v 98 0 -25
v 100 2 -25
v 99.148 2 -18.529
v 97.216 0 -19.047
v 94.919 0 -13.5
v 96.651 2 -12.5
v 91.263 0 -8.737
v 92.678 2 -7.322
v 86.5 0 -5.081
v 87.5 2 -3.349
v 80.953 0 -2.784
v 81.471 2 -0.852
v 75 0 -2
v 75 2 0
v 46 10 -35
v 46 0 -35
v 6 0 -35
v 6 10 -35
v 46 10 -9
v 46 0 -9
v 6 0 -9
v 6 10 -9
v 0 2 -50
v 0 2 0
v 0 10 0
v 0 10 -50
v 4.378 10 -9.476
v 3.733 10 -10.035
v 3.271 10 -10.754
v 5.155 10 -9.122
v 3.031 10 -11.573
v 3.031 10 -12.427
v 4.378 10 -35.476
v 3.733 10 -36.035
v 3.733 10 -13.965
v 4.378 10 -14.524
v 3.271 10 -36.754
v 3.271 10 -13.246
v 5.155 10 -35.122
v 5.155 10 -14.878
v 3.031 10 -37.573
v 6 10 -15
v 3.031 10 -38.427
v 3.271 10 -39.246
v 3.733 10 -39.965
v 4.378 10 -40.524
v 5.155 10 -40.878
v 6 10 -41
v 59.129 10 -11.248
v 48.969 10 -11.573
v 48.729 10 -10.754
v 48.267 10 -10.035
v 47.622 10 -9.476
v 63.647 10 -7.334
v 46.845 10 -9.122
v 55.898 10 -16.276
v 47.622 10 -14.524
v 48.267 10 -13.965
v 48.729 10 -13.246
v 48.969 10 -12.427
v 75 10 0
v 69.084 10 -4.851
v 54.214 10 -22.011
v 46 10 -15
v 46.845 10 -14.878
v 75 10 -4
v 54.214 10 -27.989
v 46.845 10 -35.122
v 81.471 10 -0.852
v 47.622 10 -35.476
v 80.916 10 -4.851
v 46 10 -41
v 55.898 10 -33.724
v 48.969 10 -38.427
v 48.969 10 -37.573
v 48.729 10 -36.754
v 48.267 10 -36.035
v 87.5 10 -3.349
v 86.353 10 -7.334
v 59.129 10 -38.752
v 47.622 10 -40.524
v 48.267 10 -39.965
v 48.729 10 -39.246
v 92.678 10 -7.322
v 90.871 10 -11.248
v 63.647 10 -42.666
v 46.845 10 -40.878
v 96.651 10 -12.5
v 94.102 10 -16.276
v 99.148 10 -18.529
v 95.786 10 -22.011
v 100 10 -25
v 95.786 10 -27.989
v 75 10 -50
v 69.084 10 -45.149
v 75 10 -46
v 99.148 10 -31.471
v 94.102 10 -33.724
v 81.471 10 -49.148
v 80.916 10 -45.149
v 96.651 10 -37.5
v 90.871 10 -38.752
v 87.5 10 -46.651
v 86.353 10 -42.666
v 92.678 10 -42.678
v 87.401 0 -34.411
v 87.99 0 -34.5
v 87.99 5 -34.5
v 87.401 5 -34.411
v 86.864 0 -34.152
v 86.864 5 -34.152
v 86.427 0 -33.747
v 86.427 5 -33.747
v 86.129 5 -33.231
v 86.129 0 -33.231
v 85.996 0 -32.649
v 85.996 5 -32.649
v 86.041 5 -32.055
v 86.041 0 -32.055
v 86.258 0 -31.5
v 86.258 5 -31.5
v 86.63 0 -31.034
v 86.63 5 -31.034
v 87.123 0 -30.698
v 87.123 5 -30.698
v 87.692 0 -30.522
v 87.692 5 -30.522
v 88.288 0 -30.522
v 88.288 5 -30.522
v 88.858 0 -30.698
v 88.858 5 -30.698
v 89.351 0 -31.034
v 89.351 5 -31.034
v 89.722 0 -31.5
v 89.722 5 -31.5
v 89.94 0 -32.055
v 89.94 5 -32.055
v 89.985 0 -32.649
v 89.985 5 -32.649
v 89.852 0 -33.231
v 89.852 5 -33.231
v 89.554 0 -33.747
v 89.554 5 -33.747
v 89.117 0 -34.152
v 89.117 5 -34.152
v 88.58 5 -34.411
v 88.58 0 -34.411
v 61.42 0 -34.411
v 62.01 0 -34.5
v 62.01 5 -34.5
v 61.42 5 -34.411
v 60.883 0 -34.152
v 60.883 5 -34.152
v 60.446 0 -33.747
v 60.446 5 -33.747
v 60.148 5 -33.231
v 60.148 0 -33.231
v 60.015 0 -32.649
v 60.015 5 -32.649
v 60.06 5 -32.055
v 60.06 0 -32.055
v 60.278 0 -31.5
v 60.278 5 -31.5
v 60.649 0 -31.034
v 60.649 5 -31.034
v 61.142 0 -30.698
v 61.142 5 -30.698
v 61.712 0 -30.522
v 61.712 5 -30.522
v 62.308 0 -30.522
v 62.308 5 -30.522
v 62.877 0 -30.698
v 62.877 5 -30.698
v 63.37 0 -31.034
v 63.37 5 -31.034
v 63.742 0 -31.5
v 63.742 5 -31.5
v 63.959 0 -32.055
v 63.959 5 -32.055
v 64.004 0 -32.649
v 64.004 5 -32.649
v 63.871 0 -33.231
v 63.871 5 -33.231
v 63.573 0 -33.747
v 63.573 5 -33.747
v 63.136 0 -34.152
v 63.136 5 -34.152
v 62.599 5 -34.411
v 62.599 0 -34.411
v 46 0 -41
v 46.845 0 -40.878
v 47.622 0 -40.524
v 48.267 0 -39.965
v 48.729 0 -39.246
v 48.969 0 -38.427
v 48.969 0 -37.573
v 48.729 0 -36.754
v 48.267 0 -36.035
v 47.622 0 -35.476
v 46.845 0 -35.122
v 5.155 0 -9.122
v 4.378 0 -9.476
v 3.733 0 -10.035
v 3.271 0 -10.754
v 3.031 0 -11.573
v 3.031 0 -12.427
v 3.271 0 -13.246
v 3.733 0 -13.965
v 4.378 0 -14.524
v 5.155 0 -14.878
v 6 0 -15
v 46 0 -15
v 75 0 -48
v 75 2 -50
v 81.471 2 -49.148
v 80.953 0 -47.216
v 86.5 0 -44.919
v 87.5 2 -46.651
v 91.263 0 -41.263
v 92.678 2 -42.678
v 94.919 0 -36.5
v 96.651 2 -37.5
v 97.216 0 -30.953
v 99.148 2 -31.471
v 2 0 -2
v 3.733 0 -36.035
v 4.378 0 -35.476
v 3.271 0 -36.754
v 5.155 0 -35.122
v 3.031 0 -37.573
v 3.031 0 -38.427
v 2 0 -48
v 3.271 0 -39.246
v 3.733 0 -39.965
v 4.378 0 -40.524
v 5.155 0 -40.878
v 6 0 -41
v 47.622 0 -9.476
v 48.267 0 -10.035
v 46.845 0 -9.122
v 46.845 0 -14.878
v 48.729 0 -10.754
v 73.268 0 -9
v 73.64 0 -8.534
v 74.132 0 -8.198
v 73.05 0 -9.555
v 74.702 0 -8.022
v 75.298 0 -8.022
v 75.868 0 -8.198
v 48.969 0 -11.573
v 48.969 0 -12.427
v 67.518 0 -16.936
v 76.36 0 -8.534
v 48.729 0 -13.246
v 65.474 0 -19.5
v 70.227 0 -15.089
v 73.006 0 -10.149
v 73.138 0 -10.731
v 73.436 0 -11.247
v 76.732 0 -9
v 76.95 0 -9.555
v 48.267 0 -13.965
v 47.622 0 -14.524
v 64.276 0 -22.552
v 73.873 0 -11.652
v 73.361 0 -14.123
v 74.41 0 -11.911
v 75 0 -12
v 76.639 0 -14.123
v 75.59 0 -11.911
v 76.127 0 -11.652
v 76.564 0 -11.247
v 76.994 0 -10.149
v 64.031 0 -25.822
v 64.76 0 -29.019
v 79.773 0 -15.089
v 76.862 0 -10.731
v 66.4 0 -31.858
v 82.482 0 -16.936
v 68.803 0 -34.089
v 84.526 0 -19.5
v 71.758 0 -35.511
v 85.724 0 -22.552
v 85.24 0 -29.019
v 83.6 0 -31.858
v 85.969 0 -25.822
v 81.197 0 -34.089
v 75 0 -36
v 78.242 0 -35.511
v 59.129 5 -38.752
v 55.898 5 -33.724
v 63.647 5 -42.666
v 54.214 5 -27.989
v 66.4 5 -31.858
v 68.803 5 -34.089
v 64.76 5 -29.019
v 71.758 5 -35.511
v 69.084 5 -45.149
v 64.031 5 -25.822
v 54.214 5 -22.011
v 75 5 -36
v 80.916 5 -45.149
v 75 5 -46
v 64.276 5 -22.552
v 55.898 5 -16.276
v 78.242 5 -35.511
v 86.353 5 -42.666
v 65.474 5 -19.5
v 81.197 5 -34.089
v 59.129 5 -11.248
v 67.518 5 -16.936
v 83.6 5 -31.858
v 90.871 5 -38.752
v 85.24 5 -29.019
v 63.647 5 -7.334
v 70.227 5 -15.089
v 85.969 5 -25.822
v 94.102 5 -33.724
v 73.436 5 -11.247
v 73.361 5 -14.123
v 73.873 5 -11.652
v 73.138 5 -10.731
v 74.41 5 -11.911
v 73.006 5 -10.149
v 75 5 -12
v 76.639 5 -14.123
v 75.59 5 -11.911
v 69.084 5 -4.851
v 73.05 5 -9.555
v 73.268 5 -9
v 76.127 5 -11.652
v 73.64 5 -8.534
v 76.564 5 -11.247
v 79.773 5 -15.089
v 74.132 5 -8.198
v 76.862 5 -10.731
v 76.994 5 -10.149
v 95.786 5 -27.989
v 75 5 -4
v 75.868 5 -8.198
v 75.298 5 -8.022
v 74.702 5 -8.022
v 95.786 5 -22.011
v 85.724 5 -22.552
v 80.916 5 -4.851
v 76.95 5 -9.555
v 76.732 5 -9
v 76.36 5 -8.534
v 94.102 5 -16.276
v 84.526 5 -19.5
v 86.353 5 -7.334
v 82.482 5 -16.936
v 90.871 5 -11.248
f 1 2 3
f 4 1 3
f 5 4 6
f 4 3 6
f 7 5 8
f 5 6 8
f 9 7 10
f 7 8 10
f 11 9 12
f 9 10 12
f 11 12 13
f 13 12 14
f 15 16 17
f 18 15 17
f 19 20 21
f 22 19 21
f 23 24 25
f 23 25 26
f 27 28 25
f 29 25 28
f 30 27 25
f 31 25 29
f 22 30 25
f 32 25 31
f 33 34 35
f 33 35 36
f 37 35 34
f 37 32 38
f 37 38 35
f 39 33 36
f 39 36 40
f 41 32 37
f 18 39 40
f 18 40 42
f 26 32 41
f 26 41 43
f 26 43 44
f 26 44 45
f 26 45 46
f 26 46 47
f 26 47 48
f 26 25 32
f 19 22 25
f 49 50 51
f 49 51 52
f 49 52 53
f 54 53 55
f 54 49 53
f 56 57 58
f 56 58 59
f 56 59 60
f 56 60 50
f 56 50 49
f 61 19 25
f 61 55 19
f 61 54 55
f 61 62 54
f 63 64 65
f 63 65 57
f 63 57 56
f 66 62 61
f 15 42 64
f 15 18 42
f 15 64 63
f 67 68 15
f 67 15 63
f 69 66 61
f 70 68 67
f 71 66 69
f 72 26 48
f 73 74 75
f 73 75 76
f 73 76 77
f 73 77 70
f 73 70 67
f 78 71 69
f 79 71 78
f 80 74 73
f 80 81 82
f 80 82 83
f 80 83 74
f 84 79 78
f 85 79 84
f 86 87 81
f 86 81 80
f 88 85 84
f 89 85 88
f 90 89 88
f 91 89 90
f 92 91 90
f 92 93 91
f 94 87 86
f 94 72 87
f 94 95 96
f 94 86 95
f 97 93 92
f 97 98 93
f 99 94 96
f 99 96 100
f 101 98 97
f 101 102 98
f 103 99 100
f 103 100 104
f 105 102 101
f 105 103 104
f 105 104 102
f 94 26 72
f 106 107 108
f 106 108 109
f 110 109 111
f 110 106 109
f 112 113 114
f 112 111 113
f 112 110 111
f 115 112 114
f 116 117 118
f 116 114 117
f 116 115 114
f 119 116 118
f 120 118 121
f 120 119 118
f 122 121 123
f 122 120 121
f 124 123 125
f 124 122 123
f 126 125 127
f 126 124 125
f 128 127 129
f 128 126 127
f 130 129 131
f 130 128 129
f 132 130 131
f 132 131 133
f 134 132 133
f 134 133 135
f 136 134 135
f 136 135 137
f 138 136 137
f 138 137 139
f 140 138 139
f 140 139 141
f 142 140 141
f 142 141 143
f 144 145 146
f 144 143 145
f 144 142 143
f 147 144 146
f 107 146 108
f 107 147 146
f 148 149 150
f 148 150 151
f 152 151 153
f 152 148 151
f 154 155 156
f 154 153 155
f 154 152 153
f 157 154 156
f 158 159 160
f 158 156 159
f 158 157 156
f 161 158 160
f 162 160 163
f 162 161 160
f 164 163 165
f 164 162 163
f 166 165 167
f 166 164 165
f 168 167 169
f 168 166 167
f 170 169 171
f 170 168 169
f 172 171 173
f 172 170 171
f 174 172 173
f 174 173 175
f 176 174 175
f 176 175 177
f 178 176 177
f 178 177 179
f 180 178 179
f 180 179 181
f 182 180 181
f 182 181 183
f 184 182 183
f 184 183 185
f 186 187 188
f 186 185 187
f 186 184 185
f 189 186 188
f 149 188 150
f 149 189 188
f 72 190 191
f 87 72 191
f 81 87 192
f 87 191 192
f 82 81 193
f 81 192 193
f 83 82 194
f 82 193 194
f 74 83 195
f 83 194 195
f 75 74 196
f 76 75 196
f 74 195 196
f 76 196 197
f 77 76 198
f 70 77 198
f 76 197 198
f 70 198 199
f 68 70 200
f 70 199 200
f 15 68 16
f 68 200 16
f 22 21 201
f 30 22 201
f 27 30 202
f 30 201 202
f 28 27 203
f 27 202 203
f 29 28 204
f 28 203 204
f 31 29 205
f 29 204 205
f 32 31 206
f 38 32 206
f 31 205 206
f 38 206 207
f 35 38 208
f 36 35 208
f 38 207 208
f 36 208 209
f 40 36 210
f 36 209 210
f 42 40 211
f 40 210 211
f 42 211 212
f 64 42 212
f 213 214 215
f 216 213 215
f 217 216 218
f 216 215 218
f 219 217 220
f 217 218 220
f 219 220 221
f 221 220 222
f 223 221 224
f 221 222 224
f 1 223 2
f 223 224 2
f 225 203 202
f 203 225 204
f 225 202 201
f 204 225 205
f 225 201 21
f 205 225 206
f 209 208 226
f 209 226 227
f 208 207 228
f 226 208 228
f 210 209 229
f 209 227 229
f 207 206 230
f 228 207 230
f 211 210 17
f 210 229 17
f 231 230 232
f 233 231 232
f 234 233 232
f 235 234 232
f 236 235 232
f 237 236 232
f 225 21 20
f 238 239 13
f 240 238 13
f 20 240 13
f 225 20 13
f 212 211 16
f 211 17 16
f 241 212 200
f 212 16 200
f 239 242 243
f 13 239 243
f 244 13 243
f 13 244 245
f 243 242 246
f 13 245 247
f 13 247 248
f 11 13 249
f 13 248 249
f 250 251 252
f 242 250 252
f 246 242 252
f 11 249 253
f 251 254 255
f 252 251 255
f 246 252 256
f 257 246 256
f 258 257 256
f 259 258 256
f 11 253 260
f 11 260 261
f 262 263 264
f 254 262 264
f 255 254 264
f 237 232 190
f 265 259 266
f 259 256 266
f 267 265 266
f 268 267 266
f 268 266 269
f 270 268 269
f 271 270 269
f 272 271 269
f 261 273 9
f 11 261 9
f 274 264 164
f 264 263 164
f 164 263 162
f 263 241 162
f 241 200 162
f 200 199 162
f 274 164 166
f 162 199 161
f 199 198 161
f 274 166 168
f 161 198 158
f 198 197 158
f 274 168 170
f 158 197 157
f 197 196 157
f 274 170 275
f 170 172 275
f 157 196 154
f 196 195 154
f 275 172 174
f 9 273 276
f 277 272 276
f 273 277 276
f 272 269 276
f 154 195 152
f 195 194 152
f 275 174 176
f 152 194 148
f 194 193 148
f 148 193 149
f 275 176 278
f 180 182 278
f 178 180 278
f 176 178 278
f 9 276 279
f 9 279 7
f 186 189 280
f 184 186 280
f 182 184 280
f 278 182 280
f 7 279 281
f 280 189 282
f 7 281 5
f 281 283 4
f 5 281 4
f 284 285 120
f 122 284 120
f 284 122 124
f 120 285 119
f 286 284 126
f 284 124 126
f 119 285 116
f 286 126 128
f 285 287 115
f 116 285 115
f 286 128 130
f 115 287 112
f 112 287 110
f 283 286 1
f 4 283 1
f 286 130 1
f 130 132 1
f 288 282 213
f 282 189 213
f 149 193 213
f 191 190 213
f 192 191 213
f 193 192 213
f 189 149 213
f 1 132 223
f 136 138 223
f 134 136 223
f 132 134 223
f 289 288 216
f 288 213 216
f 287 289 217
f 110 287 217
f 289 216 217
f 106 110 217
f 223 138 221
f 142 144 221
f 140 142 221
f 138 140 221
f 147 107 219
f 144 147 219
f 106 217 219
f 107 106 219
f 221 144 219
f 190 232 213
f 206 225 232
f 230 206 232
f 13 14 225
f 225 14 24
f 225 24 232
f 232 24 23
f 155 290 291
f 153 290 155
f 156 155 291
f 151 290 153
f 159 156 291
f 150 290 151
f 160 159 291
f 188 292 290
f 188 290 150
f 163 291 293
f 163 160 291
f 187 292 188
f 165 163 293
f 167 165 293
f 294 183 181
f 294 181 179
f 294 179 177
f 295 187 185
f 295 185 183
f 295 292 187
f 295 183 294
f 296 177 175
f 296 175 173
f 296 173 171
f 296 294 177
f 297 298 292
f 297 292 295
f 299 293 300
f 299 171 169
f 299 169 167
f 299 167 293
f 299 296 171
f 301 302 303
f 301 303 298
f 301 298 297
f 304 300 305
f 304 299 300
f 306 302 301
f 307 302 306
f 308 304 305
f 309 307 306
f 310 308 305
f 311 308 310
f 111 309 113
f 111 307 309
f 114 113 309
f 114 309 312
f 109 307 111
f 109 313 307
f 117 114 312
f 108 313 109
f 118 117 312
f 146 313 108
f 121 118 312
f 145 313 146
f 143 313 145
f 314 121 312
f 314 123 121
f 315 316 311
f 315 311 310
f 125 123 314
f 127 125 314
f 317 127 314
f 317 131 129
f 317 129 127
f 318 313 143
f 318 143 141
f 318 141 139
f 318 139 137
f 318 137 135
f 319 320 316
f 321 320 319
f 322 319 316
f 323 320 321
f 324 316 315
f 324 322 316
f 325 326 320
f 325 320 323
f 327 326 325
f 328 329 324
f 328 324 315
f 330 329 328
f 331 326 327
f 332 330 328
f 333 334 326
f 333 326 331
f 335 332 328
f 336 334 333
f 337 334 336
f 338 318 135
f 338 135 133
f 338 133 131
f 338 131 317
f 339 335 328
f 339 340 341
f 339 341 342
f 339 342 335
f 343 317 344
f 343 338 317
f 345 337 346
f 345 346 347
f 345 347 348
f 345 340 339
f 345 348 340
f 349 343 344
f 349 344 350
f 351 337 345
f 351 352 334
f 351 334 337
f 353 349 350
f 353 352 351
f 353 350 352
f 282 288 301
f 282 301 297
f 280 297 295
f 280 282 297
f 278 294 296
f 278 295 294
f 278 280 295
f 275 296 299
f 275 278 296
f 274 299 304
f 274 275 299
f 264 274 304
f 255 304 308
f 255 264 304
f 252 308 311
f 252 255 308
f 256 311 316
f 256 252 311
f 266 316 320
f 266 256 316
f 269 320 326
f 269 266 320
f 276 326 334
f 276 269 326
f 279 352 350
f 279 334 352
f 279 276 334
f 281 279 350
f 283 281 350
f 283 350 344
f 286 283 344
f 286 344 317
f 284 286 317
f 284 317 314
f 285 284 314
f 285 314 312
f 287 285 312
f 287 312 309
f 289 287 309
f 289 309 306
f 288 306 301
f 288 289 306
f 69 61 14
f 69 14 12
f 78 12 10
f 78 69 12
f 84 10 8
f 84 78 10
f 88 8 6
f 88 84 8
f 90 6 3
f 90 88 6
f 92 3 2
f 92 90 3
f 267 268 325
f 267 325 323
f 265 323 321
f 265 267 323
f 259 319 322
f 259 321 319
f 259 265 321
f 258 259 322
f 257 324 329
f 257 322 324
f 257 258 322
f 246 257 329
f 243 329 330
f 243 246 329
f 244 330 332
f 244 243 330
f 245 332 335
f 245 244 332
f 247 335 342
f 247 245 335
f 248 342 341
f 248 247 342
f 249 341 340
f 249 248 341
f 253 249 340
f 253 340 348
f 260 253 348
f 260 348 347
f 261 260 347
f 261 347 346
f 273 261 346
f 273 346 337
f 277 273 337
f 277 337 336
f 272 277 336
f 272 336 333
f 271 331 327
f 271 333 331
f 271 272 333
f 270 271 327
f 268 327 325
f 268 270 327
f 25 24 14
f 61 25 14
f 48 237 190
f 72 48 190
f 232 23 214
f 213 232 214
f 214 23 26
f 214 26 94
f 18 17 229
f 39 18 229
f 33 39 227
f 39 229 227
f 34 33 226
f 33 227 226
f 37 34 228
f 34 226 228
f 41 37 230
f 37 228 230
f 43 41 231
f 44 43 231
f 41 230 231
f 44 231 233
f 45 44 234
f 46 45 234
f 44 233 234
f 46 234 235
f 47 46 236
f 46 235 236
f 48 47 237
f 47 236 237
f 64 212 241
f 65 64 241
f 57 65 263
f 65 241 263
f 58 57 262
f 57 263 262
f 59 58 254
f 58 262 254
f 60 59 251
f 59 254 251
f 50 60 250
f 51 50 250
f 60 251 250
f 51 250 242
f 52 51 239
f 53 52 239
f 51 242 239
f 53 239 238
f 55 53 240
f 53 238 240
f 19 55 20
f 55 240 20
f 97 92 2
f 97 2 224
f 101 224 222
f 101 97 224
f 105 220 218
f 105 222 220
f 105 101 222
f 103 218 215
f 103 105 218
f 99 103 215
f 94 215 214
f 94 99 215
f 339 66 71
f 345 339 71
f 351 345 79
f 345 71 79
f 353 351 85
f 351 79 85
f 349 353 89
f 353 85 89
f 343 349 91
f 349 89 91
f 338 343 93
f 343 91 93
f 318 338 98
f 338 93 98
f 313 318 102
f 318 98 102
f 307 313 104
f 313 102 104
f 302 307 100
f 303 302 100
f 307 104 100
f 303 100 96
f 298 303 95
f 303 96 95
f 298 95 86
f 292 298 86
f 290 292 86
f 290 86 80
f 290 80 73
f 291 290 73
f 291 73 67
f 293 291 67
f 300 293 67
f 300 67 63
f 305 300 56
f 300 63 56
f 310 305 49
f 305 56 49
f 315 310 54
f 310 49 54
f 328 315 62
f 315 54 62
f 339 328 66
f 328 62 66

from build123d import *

# Parameters (mm, degrees)
SKETCH1_W               = 100
SKETCH1_H               = 50
BOSS_EXTRUDE1_DEPTH     = 10
FILLET1_R               = 25
CUT_EXTRUDE1_DEPTH      = 113.249721603
CUT_EXTRUDE1_DEPTH_BACK = 113.249721603
SKETCH2_R               = 11
SKETCH2_R_2             = 2
SKETCH3_R               = 21
CUT_EXTRUDE2_DEPTH      = 5
CUT_EXTRUDE3_DEPTH      = 113.249721603
CUT_EXTRUDE3_DEPTH_BACK = 113.249721603
CHAMFER1_SIZE           = 2


with BuildPart() as part:
    # Sketch1 → Boss-Extrude1 (new body)
    with BuildSketch(Plane(origin=(0, 0, 0), x_dir=(1, 0, 0), z_dir=(0, 1, 0))):
        with Locations((50, 25)):
            Rectangle(SKETCH1_W, SKETCH1_H)
    extrude(amount=BOSS_EXTRUDE1_DEPTH)

    # Fillet1
    fillet1_edges = [part.edges().sort_by_distance(p)[0] for p in [
        (100, 5, -50),
        (100, 5, 0),
    ]]
    fillet(fillet1_edges, radius=FILLET1_R - 0.0001)  # a hair under: the kernel refuses the full size

    # Sketch2 → Cut-Extrude1 (cut, two sides: drawn at the far end of the back side and taken through both)
    with BuildSketch(Plane(origin=(0, 0, 0), x_dir=(1, 0, 0), z_dir=(0, 1, 0)).offset(-CUT_EXTRUDE1_DEPTH_BACK)):
        with Locations(Location((75, 25, 0), (0, 0, 90))):
            Circle(SKETCH2_R)
        with Locations(Location((75, 10, 0), (0, 0, 90))):
            Circle(SKETCH2_R_2)
        with Locations(Location((62.009618943, 32.5, 0), (0, 0, 90))):
            Circle(SKETCH2_R_2)
        with Locations(Location((87.990381057, 32.5, 0), (0, 0, 90))):
            Circle(SKETCH2_R_2)
    extrude(amount=CUT_EXTRUDE1_DEPTH + CUT_EXTRUDE1_DEPTH_BACK, mode=Mode.SUBTRACT)

    # Sketch3 → Cut-Extrude2 (cut)
    with BuildSketch(Plane(origin=(0, 10, 0), x_dir=(1, 0, 0), z_dir=(0, 1, 0))):
        with Locations(Location((75, 25, 0), (0, 0, 270))):
            Circle(SKETCH3_R)
    extrude(amount=-CUT_EXTRUDE2_DEPTH, mode=Mode.SUBTRACT)

    # Sketch4 → Cut-Extrude3 (cut, two sides: drawn at the far end of the back side and taken through both)
    with BuildSketch(Plane(origin=(0, 0, 0), x_dir=(1, 0, 0), z_dir=(0, 1, 0)).offset(-CUT_EXTRUDE3_DEPTH_BACK)):
        with BuildLine():
            Line((6, 15), (46, 15))
            ThreePointArc((46, 15), (49, 12), (46, 9))
            Line((46, 9), (6, 9))
            ThreePointArc((6, 9), (3, 12), (6, 15))
        make_face()
        with BuildLine():
            Line((46, 35), (6, 35))
            ThreePointArc((6, 35), (3, 38), (6, 41))
            Line((6, 41), (46, 41))
            ThreePointArc((46, 41), (49, 38), (46, 35))
        make_face()
    extrude(amount=CUT_EXTRUDE3_DEPTH + CUT_EXTRUDE3_DEPTH_BACK, mode=Mode.SUBTRACT)

    # Chamfer1
    chamfer1_edges = [part.edges().sort_by_distance(p)[0] for p in [
        (37.50005, 0, -50),
        (92.677698819, 0, -7.322301181),
        (92.677698819, 0, -42.677698819),
        (37.50005, 0, 0),
        (0, 0, -25),
    ]]
    chamfer(chamfer1_edges, length=CHAMFER1_SIZE)


solid = part.part
